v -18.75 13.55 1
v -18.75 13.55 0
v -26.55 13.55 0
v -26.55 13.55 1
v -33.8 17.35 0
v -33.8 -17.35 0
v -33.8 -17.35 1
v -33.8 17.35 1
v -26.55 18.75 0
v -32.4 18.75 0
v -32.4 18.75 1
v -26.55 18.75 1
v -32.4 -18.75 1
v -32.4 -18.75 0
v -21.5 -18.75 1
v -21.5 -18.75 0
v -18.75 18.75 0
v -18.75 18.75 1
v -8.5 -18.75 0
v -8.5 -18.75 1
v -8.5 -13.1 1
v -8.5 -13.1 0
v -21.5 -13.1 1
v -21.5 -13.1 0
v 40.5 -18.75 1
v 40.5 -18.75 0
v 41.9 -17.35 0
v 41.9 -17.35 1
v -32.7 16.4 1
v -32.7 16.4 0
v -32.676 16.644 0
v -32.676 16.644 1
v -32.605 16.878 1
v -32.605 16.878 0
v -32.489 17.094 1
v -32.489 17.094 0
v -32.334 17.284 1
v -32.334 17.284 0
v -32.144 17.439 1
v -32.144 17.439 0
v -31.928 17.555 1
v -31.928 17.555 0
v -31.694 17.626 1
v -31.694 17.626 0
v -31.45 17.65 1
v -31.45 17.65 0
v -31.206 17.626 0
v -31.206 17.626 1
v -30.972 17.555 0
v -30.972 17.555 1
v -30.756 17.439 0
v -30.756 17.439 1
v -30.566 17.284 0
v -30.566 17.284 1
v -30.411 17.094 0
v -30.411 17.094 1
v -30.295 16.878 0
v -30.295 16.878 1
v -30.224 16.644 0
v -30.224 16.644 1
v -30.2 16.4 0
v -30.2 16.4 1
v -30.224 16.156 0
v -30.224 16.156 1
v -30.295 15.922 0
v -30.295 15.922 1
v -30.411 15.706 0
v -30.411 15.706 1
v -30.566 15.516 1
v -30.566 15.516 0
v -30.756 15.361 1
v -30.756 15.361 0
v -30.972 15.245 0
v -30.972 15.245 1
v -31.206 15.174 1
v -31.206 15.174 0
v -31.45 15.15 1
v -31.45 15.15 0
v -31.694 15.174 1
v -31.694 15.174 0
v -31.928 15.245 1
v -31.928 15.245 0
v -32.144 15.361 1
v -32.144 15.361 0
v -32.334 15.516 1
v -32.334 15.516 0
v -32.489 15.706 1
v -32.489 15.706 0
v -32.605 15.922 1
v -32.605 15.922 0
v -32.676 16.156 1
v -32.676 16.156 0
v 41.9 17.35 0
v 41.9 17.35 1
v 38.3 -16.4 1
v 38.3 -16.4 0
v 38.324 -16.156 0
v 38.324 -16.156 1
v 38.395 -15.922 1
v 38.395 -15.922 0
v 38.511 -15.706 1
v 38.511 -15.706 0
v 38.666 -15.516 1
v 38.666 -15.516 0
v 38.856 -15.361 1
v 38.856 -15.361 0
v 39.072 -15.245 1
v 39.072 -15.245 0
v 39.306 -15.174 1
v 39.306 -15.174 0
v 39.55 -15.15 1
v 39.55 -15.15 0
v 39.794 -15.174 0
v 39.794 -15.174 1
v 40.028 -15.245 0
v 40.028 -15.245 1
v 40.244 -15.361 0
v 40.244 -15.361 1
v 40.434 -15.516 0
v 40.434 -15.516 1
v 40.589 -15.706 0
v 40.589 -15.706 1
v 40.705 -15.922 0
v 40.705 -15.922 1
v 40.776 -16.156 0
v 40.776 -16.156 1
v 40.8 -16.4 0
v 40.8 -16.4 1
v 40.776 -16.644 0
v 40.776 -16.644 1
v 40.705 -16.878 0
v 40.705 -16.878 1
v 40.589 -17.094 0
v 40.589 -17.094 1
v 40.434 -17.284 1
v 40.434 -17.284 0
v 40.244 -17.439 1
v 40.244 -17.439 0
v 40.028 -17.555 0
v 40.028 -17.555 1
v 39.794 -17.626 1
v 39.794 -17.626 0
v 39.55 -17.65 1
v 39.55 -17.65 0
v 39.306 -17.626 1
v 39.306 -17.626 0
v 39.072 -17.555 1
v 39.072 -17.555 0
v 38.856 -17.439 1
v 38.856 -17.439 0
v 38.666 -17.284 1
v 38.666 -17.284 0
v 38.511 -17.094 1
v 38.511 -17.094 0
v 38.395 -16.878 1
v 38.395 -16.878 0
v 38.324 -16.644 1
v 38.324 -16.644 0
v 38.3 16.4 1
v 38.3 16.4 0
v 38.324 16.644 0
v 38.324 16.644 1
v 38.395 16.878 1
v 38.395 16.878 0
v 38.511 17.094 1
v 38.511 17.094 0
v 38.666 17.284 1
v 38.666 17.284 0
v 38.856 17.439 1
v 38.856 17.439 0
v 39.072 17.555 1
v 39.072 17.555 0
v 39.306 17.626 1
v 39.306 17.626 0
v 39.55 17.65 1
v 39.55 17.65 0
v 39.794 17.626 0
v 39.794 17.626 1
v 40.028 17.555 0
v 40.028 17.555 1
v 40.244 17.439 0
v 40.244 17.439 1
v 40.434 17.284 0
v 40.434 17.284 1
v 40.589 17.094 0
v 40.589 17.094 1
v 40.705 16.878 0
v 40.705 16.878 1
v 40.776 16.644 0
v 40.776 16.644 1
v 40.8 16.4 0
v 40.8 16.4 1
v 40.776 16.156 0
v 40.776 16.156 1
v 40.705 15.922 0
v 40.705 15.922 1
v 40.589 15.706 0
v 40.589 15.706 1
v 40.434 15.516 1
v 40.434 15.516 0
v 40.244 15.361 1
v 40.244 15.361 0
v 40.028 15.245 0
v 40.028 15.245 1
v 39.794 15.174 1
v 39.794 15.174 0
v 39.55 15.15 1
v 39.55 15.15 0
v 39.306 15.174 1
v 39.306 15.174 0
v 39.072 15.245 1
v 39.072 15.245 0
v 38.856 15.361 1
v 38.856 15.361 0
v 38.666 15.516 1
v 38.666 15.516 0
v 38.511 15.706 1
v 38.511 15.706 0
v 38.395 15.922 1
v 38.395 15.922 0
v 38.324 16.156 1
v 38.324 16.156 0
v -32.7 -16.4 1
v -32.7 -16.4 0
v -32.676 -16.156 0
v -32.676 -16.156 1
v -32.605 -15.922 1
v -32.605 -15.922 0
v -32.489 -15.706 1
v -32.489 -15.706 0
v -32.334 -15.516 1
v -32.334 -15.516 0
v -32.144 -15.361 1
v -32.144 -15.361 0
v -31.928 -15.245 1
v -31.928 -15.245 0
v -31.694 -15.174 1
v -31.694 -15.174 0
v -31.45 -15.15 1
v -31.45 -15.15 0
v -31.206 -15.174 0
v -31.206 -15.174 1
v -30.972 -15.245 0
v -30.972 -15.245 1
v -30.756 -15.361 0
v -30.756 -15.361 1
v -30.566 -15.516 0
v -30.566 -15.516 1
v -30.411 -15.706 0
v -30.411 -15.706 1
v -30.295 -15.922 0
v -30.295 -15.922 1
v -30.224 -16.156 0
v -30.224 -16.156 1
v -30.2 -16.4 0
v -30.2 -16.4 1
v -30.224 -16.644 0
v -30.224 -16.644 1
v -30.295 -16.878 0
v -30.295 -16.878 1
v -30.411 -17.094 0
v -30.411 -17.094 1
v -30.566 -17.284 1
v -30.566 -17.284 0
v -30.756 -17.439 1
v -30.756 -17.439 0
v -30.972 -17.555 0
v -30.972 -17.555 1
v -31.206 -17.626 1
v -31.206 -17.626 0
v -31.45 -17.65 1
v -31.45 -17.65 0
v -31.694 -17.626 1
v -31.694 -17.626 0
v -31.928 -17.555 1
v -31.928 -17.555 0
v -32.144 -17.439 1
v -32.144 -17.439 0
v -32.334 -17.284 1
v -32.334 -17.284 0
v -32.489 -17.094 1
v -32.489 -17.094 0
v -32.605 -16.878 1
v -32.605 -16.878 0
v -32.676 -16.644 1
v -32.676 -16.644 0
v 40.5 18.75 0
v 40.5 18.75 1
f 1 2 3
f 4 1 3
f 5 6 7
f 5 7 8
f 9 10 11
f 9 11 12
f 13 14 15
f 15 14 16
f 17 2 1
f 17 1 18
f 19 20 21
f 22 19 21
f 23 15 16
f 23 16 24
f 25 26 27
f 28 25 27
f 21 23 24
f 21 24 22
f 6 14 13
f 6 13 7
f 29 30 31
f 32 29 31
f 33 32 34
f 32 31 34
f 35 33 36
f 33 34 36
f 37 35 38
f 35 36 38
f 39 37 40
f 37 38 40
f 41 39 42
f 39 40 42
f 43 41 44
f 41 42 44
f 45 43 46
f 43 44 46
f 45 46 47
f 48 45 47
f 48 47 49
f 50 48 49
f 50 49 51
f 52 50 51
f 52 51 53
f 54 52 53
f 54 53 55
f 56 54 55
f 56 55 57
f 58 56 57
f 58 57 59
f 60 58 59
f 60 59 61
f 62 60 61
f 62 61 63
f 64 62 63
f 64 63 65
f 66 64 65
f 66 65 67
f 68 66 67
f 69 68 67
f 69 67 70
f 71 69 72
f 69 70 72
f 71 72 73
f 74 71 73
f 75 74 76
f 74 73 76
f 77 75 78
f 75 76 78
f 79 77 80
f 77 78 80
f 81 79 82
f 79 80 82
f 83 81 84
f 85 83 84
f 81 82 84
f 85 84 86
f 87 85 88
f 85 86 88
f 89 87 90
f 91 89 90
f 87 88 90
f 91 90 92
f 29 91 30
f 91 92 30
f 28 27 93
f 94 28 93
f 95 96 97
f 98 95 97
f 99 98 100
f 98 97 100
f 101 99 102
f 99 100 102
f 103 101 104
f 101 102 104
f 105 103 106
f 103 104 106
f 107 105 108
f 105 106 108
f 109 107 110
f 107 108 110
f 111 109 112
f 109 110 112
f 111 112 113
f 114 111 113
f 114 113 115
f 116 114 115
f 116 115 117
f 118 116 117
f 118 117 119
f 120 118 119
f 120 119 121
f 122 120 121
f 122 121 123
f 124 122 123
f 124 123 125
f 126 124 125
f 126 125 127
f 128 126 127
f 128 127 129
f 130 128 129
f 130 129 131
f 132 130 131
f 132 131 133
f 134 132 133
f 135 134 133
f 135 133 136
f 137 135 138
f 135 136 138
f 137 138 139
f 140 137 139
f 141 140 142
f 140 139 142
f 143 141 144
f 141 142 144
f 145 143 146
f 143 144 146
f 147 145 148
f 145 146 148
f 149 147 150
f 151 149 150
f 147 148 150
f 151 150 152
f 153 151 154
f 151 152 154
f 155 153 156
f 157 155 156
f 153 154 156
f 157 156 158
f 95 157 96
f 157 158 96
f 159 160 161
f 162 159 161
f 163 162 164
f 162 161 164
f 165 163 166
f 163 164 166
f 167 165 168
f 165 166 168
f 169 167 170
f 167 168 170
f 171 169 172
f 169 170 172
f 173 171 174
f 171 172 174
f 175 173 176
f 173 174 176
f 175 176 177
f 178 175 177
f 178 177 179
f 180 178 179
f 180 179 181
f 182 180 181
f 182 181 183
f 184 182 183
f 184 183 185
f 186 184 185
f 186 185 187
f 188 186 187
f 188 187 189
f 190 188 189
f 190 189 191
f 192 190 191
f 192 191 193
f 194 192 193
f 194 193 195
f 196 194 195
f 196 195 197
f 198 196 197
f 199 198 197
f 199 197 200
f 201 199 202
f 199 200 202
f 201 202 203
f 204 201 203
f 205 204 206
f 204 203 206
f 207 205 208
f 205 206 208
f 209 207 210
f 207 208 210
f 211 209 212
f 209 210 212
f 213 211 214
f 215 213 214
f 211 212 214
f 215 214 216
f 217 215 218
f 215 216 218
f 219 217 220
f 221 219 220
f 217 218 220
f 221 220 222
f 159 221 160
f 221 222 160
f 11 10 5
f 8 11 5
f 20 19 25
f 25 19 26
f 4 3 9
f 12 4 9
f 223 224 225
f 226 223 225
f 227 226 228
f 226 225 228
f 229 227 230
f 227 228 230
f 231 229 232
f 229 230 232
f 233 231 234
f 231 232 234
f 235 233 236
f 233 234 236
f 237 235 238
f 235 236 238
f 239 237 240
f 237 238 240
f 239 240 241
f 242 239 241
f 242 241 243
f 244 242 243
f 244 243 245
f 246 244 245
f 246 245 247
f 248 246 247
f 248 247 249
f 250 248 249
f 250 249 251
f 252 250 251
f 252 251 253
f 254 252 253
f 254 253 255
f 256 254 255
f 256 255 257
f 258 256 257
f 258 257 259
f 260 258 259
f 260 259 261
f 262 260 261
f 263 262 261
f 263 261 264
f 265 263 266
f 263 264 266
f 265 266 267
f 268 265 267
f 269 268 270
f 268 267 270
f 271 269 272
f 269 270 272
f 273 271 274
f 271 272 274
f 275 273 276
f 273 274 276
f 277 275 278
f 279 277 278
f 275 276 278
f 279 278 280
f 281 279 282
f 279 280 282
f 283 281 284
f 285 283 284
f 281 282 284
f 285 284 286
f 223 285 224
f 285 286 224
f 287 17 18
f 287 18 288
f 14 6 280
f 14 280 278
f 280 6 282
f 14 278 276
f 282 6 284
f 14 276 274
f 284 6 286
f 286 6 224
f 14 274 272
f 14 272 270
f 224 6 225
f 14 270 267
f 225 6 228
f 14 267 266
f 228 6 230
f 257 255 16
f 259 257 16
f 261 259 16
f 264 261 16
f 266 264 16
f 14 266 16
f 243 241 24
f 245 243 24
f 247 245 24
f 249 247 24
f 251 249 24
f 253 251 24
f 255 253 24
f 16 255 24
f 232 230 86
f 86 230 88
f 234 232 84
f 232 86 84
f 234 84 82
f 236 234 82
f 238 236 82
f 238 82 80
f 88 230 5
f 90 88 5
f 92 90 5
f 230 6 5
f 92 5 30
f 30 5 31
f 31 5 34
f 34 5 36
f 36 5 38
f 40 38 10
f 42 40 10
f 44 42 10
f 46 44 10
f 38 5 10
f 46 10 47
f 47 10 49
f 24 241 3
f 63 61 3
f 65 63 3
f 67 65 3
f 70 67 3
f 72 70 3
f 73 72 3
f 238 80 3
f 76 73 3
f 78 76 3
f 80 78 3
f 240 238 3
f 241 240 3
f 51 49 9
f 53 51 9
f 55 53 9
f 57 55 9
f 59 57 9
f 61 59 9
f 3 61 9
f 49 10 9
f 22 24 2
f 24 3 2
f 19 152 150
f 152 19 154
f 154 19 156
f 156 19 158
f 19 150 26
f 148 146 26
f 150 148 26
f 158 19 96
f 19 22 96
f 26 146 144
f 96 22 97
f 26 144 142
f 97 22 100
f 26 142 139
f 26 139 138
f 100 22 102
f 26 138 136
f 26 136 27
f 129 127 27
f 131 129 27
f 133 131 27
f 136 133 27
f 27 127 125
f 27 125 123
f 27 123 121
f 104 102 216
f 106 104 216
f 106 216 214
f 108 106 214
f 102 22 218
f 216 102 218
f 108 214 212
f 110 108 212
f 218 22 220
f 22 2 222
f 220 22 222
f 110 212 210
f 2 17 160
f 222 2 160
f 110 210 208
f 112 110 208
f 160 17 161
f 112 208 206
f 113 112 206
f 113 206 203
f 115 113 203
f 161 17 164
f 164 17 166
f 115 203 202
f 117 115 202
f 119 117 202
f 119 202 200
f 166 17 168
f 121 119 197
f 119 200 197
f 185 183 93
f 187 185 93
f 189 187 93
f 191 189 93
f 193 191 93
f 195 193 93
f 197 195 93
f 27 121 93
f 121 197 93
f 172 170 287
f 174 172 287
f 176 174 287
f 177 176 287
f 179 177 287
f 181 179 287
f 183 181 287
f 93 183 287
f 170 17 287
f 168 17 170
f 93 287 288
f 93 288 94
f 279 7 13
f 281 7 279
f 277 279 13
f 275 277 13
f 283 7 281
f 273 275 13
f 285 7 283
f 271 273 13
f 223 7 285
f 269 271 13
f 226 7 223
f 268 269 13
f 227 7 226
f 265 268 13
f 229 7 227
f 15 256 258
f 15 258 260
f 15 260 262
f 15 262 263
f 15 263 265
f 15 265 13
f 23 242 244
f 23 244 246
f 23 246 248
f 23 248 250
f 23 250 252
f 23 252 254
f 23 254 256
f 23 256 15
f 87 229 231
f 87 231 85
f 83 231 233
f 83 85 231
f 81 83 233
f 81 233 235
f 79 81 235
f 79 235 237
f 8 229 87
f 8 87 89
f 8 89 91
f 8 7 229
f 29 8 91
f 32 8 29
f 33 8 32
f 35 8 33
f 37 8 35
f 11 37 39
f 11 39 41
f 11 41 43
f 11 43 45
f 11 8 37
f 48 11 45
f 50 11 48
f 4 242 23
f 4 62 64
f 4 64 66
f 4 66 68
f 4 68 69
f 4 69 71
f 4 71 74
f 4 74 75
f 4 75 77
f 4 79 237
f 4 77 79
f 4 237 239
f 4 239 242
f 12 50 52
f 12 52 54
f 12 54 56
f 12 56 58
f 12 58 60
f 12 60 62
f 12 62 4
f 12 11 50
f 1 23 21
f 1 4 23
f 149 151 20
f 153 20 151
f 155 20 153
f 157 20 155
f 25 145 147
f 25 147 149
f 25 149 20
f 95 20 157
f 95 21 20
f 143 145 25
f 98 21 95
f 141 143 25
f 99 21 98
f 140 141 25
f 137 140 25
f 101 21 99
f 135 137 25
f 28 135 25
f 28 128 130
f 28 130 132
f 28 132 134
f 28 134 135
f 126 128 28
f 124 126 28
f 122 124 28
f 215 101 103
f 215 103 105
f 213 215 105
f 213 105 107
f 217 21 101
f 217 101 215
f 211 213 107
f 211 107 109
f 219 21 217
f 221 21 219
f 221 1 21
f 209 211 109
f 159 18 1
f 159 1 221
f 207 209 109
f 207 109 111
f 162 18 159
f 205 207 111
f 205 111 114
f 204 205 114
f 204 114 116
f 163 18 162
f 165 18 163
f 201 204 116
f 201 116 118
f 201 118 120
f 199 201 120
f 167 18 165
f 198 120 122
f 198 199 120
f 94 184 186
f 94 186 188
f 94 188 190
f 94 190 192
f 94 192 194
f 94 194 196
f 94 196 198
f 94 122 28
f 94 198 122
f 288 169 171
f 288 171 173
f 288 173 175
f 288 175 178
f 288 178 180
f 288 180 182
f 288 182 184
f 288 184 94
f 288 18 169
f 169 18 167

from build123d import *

# Parameters (mm, degrees)
SKETCH1_W                = 33.8
SKETCH1_H                = 37.5
BOSS_EXTRUDE_NOANT_DEPTH = 1
SKETCH2_W                = 41.9
SKETCH2_H                = 37.5
BOSS_EXTRUDE_ANT_DEPTH   = 1
SKETCH3_R                = 1.25
HOLES_DEPTH              = 46.914839649
CORNERS_DEPTH            = 46.914839649
SKETCH5_W                = 13
SKETCH5_H                = 5.65
CUT_EXTRUDE1_DEPTH       = 46.914839649
SKETCH6_W                = 7.8
SKETCH6_H                = 5.2
CUT_EXTRUDE2_DEPTH       = 46.914839649


with BuildPart() as part:
    # Sketch1 → Boss-Extrude-NoAnt (new body)
    with BuildSketch(Plane.XY):
        with Locations((-16.9, 0)):
            Rectangle(SKETCH1_W, SKETCH1_H)
    extrude(amount=BOSS_EXTRUDE_NOANT_DEPTH)

    # Sketch2 → Boss-Extrude-Ant (add)
    with BuildSketch(Plane.XY):
        with Locations((20.95, 0)):
            Rectangle(SKETCH2_W, SKETCH2_H)
    extrude(amount=BOSS_EXTRUDE_ANT_DEPTH)

    # Sketch3 → Holes (cut, through all)
    with BuildSketch(Plane(origin=(0, 0, 0), x_dir=(-1, 0, 0), z_dir=(0, 0, -1))):
        with Locations((31.45, -16.4)):
            Circle(SKETCH3_R)
        with Locations((-39.55, -16.4)):
            Circle(SKETCH3_R)
        with Locations((-39.55, 16.4)):
            Circle(SKETCH3_R)
        with Locations((31.45, 16.4)):
            Circle(SKETCH3_R)
    extrude(amount=-HOLES_DEPTH, mode=Mode.SUBTRACT)

    # Sketch4 → Corners (cut, through all)
    with BuildSketch(Plane(origin=(0, 0, 0), x_dir=(-1, 0, 0), z_dir=(0, 0, -1))):
        Polygon((-41.9, 18.75), (-40.5, 18.75), (-41.9, 17.35), align=None)
        Polygon((-41.9, -17.35), (-41.9, -18.75), (-40.5, -18.75), align=None)
        Polygon((33.8, -18.75), (32.4, -18.75), (33.8, -17.35), align=None)
        Polygon((33.8, 17.35), (33.8, 18.75), (32.4, 18.75), align=None)
    extrude(amount=-CORNERS_DEPTH, mode=Mode.SUBTRACT)

    # Sketch5 → Cut-Extrude1 (cut, through all)
    with BuildSketch(Plane.XY.offset(1)):
        with Locations((-15, -15.925)):
            Rectangle(SKETCH5_W, SKETCH5_H)
    extrude(amount=-CUT_EXTRUDE1_DEPTH, mode=Mode.SUBTRACT)

    # Sketch6 → Cut-Extrude2 (cut, through all)
    with BuildSketch(Plane(origin=(0, 0, 0), x_dir=(-1, 0, 0), z_dir=(0, 0, -1))):
        with Locations((22.65, 16.15)):
            Rectangle(SKETCH6_W, SKETCH6_H)
    extrude(amount=-CUT_EXTRUDE2_DEPTH, mode=Mode.SUBTRACT)


solid = part.part
